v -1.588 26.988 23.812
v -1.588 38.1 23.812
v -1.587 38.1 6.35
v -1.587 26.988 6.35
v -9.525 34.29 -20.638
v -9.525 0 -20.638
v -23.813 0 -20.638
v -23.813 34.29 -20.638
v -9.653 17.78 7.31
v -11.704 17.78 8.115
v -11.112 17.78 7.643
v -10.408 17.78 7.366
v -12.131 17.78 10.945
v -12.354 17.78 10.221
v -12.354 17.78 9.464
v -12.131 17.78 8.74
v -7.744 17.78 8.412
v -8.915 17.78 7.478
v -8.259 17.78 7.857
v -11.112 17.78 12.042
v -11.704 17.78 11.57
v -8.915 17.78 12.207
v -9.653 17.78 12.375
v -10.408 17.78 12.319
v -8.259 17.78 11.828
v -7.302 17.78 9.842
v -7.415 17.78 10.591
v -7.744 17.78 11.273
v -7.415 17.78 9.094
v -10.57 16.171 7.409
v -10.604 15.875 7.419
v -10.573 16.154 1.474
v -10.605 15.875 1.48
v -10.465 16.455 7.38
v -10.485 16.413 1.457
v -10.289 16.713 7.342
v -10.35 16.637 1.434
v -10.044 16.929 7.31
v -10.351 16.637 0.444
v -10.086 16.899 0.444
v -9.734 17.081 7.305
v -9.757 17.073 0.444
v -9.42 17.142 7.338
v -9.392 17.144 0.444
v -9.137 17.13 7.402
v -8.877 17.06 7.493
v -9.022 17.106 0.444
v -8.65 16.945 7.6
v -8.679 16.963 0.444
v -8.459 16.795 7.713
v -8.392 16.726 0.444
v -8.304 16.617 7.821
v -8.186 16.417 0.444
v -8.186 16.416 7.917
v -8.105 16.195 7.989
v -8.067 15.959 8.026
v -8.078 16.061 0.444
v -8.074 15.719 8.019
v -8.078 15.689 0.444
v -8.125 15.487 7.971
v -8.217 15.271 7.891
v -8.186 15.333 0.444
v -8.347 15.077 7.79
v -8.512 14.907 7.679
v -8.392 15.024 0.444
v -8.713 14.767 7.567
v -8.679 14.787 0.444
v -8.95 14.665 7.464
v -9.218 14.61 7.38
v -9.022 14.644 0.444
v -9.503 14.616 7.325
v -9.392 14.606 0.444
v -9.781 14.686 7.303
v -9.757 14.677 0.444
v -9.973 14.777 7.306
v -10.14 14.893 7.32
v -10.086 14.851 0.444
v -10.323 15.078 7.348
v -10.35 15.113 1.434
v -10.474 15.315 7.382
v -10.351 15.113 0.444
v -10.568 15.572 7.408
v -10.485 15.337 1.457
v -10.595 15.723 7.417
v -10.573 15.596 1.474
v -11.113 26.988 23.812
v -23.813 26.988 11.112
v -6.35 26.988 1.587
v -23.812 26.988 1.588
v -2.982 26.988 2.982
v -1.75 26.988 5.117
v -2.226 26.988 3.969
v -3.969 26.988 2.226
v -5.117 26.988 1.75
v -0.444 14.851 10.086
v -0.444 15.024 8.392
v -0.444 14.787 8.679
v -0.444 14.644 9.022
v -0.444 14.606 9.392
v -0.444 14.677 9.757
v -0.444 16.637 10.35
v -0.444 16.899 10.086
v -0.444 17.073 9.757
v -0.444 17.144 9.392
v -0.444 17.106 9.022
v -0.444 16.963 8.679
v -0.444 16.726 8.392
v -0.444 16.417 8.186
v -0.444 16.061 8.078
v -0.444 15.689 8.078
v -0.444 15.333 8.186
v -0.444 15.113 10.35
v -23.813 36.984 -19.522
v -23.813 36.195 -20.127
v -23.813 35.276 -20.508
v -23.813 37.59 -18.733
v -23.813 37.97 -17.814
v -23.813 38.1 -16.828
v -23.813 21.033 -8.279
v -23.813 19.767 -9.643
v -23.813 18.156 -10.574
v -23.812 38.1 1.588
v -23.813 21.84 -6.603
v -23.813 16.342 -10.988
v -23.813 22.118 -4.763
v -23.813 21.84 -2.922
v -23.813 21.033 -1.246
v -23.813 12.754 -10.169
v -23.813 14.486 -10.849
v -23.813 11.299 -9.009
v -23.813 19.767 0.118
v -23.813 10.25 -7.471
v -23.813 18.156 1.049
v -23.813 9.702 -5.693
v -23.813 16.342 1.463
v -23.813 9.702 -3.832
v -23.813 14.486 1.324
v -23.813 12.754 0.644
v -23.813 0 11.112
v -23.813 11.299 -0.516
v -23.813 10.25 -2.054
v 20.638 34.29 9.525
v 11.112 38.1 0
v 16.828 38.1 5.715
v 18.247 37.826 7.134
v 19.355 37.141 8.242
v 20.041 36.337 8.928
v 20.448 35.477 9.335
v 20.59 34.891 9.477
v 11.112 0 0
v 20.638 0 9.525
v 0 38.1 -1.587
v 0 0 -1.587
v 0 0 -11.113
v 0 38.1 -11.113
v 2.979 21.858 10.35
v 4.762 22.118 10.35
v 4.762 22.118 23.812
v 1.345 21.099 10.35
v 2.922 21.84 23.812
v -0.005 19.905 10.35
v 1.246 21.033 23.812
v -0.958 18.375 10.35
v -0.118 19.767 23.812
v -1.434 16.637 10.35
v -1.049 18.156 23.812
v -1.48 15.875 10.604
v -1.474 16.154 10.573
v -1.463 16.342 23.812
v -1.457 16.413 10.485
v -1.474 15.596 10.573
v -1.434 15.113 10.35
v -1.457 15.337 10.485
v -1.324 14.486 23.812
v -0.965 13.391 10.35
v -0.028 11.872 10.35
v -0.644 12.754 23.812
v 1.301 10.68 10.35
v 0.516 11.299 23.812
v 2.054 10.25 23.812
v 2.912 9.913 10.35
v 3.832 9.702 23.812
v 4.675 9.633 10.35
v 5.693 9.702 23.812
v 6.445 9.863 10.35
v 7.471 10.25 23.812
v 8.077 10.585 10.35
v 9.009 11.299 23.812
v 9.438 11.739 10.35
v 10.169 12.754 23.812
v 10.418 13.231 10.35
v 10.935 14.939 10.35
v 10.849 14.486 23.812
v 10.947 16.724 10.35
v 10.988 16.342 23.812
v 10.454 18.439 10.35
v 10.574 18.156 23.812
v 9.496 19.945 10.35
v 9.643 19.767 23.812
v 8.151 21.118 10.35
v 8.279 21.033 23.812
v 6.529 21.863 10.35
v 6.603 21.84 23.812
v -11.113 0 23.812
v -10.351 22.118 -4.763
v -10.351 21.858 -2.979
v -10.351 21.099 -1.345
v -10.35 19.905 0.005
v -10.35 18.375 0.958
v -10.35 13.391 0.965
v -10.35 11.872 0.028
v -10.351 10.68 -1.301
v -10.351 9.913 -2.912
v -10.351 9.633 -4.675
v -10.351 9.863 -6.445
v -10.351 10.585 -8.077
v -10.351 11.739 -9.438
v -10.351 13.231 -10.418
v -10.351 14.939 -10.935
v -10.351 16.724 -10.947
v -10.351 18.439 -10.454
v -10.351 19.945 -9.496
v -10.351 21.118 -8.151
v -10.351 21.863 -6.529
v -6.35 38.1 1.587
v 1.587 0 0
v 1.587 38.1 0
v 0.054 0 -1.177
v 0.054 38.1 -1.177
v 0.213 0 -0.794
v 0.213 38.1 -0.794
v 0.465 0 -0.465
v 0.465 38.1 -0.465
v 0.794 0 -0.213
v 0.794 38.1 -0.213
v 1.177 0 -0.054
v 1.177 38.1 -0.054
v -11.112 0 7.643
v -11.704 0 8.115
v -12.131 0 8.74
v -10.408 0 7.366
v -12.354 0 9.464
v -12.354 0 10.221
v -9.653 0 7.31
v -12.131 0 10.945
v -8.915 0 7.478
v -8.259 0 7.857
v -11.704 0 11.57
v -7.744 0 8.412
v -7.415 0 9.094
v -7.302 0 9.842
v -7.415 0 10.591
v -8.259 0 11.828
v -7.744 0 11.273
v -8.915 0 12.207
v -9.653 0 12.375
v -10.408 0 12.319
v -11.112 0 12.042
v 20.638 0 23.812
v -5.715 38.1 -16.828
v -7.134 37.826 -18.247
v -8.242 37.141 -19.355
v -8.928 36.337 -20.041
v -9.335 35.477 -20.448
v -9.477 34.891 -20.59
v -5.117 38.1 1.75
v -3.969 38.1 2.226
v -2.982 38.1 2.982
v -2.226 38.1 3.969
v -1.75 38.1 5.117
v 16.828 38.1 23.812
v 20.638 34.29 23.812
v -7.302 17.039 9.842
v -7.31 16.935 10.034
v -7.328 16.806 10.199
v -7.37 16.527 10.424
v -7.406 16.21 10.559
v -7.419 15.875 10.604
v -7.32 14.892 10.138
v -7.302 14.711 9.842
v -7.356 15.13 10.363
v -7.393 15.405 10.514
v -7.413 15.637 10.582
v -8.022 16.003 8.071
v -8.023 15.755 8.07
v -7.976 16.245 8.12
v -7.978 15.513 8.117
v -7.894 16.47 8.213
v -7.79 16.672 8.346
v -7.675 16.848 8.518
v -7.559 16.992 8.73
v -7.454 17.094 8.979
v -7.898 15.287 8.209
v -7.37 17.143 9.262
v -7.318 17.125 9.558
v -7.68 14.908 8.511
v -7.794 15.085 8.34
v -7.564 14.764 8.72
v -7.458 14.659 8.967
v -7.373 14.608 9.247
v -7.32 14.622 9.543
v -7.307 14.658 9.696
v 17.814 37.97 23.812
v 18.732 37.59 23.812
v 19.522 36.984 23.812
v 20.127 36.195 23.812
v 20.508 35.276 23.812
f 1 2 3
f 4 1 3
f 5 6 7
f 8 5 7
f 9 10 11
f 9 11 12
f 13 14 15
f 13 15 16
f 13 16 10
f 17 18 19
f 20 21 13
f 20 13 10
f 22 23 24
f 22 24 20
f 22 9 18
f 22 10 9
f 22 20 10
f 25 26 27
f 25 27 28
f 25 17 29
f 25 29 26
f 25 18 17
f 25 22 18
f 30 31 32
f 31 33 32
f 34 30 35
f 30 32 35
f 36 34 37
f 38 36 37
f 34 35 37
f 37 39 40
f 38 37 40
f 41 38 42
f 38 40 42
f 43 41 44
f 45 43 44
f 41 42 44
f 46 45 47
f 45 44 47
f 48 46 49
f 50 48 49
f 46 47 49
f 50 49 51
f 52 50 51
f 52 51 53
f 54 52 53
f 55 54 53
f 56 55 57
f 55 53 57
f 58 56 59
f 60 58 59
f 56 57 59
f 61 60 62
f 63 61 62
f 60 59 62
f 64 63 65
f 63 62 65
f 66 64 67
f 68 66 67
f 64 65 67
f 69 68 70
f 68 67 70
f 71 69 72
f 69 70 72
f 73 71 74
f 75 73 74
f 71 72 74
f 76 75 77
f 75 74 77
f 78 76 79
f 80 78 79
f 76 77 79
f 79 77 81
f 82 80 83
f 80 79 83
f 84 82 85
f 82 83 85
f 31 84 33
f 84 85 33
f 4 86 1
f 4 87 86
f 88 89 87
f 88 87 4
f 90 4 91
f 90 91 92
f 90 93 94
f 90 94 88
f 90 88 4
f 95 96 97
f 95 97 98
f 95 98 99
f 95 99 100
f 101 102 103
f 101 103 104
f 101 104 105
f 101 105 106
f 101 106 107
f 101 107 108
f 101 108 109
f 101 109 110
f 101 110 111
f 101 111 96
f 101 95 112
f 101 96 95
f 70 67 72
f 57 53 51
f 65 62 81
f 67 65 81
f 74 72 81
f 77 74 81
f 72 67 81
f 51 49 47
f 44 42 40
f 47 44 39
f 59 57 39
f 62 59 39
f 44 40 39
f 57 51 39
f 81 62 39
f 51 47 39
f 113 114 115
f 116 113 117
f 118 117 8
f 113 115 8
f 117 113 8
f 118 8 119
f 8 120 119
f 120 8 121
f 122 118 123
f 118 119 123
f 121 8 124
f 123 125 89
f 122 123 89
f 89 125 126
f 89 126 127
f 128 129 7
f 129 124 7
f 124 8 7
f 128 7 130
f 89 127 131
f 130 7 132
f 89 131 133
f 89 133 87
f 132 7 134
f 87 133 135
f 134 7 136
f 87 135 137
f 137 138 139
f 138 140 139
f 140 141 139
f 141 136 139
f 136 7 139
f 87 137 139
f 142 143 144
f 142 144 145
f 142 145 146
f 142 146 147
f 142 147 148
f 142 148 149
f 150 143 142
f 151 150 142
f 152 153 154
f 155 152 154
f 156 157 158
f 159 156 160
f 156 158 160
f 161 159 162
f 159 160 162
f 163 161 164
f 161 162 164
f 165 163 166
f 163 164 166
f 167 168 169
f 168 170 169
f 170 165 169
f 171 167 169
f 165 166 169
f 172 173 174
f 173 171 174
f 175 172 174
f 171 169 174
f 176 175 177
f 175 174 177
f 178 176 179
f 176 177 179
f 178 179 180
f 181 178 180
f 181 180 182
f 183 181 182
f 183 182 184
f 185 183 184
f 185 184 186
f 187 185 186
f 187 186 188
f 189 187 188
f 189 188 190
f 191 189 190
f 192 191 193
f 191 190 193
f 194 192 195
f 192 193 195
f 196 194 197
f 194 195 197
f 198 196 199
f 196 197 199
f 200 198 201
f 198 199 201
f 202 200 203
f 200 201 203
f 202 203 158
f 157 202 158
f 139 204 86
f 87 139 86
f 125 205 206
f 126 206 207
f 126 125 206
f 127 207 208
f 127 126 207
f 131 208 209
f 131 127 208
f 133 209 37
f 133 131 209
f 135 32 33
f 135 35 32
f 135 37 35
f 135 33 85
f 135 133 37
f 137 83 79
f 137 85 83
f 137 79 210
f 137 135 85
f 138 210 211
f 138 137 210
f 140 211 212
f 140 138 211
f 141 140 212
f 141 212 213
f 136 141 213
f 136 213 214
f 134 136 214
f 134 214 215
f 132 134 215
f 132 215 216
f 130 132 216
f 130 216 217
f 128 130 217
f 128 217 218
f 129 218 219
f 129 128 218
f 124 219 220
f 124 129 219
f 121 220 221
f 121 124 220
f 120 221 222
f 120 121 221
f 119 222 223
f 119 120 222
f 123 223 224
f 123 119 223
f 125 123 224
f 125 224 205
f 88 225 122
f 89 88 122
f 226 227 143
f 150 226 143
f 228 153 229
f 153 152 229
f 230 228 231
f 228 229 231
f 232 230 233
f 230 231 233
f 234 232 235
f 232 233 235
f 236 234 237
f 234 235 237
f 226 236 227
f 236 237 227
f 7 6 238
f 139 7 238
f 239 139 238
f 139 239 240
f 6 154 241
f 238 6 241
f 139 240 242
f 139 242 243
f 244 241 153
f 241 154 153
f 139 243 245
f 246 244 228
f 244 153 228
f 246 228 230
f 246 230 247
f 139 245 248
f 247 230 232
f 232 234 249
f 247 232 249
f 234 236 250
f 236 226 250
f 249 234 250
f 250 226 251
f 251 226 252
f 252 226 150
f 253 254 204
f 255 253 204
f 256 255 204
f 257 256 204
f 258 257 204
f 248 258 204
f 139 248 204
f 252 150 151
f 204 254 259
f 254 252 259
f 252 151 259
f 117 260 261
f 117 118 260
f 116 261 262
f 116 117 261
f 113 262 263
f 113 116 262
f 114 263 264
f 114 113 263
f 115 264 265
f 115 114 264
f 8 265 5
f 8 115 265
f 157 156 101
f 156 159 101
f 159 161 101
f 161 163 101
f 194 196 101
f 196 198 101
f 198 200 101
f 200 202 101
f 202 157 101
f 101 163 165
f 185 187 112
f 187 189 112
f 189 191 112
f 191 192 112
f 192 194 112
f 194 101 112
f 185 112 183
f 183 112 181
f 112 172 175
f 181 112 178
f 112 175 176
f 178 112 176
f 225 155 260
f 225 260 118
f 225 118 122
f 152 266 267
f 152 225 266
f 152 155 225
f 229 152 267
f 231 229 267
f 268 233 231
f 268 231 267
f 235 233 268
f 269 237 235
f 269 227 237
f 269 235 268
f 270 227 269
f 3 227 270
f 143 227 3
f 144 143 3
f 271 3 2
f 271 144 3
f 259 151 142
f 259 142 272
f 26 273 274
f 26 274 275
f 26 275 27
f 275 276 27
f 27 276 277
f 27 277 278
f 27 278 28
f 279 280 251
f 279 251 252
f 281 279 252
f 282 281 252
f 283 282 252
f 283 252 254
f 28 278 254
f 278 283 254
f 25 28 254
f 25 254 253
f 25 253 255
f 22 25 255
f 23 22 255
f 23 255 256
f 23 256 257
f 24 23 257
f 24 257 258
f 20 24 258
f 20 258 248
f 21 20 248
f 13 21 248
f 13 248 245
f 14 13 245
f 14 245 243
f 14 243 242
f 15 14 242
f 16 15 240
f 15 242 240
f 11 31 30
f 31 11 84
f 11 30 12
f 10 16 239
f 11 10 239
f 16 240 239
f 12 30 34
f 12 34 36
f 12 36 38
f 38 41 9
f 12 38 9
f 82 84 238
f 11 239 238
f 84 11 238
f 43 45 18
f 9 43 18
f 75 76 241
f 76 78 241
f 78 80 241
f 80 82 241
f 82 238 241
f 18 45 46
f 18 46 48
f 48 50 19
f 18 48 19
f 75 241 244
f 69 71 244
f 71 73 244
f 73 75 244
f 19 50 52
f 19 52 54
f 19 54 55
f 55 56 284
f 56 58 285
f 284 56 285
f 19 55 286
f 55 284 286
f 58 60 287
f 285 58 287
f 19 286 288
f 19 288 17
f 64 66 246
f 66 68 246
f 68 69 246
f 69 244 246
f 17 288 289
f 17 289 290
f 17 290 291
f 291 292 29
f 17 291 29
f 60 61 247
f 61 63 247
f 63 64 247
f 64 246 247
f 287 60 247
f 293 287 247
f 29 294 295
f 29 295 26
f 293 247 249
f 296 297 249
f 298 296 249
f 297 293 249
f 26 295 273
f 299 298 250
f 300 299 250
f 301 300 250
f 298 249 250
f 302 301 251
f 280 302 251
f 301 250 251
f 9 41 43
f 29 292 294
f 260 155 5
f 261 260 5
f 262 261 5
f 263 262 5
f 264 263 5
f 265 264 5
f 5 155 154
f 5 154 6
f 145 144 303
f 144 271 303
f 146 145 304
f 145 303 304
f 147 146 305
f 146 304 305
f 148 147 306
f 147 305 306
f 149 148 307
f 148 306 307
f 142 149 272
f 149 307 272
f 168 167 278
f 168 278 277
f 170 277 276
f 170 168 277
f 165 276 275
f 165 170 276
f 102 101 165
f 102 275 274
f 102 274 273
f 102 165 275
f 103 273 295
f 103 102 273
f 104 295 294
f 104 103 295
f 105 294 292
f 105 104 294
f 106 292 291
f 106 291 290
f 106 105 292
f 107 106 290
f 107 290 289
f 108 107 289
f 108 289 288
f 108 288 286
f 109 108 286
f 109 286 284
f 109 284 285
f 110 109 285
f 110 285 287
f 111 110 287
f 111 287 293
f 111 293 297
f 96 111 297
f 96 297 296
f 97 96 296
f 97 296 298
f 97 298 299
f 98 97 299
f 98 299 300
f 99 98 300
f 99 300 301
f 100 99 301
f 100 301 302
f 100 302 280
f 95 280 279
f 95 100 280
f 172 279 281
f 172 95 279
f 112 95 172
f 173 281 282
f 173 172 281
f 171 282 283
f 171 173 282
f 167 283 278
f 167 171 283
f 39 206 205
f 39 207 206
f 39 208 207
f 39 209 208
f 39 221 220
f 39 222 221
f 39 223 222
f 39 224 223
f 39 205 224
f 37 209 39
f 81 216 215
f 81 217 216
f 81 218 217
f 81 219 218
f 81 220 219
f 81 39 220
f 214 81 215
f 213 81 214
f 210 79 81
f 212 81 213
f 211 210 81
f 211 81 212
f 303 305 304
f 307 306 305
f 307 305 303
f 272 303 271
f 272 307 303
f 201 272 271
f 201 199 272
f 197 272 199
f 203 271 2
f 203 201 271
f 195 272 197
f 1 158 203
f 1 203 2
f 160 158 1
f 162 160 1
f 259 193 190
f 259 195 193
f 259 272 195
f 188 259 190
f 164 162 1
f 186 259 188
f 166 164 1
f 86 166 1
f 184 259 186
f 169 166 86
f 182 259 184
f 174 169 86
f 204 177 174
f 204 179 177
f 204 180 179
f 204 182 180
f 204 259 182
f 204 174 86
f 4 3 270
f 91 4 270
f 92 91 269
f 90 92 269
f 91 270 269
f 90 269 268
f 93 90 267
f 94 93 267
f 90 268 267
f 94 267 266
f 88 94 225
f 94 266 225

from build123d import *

# Parameters (mm, degrees)
BOSS_EXTRUDE2_DEPTH = 38.1
SKETCH24_W          = 13.462
SKETCH24_H          = 6.242787019
FILLET16_R          = 3.81
CUT_EXTRUDE3_DEPTH  = 11.1125
SKETCH101_R         = 2.54
CUT_EXTRUDE4_DEPTH  = 17.78
SKETCH102_W         = 10.16
SKETCH102_H         = 1.27
CHAMFER1_SIZE       = 12.7
FILLET17_R          = 1.5875


with BuildPart() as part:
    # Sketch7 → Boss-Extrude2 (new body)
    with BuildSketch(Plane(origin=(0, 0, 0), x_dir=(1, 0, 0), z_dir=(0, 1, 0))):
        Polygon((0, 0), (11.1125, 0), (20.6375, -9.525), (20.6375, -23.8125), (-23.8125, -23.8125), align=None)
    boss_extrude2 = extrude(amount=BOSS_EXTRUDE2_DEPTH)

    # Sketch24 → Port Manifold (revolve, cut)
    with BuildSketch(Plane.ZY.offset(-4.7625)):
        with Locations((17.0815, 18.99639351)):
            Rectangle(SKETCH24_W, SKETCH24_H)
    port_manifold = revolve(axis=Axis((4.7625, 15.875, 10.3505), (0, 0, 1)), mode=Mode.SUBTRACT)

    # Mirror6: Boss-Extrude2, Port Manifold across Plane1
    add(boss_extrude2.mirror(Plane(origin=(0, 0, 0), x_dir=(0.707106781, 0, -0.707106781), z_dir=(0.707106781, 0, 0.707106781))))
    add(port_manifold.mirror(Plane(origin=(0, 0, 0), x_dir=(0.707106781, 0, -0.707106781), z_dir=(0.707106781, 0, 0.707106781))), mode=Mode.SUBTRACT)

    # Fillet16
    fillet16_edges = [part.edges().sort_by_distance(p)[0] for p in [
        (20.6375, 38.1, 16.66875),
        (-16.66875, 38.1, -20.6375),
    ]]
    fillet(fillet16_edges, radius=FILLET16_R)

    # Sketch93 → Cut-Extrude3 (cut)
    with BuildSketch(Plane(origin=(0, 38.1, 0), x_dir=(1, 0, 0), z_dir=(0, 1, 0))):
        with BuildLine():
            Line((-23.8125, -23.8125), (-1.5875, -23.8125))
            Line((-1.5875, -23.8125), (-1.5875, -6.35))
            ThreePointArc((-1.5875, -6.35), (-2.982403955, -2.982403955), (-6.35, -1.5875))
            Line((-6.35, -1.5875), (-23.8125, -1.5875))
            Line((-23.8125, -1.5875), (-23.8125, -23.8125))
        make_face()
    extrude(amount=-CUT_EXTRUDE3_DEPTH, mode=Mode.SUBTRACT)

    # Sketch101 → Cut-Extrude4 (cut)
    with BuildSketch(Plane.XZ):
        with Locations((-9.8425, 9.8425)):
            Circle(SKETCH101_R)
    extrude(amount=-CUT_EXTRUDE4_DEPTH, mode=Mode.SUBTRACT)

    # Sketch102 → Cut-Revolve1 (revolve, cut)
    with BuildSketch(Plane(origin=(0, 15.875, 0), x_dir=(1, 0, 0), z_dir=(0, 1, 0))):
        with Locations((-5.5245, -9.9695)):
            Rectangle(SKETCH102_W, SKETCH102_H)
    cut_revolve1 = revolve(axis=Axis((-0.4445, 15.875, 9.3345), (-1, 0, 0)), mode=Mode.SUBTRACT)

    # Mirror10: Cut-Revolve1 across plane
    add(cut_revolve1.mirror(Plane(origin=(0, 0, 0), x_dir=(-0.707106781, 0, 0.707106781), z_dir=(0.707106781, 0, 0.707106781))), mode=Mode.SUBTRACT)

    # Chamfer1
    chamfer1_edges = [part.edges().sort_by_distance(p)[0] for p in [
        (-23.8125, 13.49375, 23.8125),
    ]]
    chamfer(chamfer1_edges, length=CHAMFER1_SIZE)

    # Fillet17
    fillet17_edges = [part.edges().sort_by_distance(p)[0] for p in [
        (0, 19.05, 0),
    ]]
    fillet(fillet17_edges, radius=FILLET17_R)


solid = part.part
